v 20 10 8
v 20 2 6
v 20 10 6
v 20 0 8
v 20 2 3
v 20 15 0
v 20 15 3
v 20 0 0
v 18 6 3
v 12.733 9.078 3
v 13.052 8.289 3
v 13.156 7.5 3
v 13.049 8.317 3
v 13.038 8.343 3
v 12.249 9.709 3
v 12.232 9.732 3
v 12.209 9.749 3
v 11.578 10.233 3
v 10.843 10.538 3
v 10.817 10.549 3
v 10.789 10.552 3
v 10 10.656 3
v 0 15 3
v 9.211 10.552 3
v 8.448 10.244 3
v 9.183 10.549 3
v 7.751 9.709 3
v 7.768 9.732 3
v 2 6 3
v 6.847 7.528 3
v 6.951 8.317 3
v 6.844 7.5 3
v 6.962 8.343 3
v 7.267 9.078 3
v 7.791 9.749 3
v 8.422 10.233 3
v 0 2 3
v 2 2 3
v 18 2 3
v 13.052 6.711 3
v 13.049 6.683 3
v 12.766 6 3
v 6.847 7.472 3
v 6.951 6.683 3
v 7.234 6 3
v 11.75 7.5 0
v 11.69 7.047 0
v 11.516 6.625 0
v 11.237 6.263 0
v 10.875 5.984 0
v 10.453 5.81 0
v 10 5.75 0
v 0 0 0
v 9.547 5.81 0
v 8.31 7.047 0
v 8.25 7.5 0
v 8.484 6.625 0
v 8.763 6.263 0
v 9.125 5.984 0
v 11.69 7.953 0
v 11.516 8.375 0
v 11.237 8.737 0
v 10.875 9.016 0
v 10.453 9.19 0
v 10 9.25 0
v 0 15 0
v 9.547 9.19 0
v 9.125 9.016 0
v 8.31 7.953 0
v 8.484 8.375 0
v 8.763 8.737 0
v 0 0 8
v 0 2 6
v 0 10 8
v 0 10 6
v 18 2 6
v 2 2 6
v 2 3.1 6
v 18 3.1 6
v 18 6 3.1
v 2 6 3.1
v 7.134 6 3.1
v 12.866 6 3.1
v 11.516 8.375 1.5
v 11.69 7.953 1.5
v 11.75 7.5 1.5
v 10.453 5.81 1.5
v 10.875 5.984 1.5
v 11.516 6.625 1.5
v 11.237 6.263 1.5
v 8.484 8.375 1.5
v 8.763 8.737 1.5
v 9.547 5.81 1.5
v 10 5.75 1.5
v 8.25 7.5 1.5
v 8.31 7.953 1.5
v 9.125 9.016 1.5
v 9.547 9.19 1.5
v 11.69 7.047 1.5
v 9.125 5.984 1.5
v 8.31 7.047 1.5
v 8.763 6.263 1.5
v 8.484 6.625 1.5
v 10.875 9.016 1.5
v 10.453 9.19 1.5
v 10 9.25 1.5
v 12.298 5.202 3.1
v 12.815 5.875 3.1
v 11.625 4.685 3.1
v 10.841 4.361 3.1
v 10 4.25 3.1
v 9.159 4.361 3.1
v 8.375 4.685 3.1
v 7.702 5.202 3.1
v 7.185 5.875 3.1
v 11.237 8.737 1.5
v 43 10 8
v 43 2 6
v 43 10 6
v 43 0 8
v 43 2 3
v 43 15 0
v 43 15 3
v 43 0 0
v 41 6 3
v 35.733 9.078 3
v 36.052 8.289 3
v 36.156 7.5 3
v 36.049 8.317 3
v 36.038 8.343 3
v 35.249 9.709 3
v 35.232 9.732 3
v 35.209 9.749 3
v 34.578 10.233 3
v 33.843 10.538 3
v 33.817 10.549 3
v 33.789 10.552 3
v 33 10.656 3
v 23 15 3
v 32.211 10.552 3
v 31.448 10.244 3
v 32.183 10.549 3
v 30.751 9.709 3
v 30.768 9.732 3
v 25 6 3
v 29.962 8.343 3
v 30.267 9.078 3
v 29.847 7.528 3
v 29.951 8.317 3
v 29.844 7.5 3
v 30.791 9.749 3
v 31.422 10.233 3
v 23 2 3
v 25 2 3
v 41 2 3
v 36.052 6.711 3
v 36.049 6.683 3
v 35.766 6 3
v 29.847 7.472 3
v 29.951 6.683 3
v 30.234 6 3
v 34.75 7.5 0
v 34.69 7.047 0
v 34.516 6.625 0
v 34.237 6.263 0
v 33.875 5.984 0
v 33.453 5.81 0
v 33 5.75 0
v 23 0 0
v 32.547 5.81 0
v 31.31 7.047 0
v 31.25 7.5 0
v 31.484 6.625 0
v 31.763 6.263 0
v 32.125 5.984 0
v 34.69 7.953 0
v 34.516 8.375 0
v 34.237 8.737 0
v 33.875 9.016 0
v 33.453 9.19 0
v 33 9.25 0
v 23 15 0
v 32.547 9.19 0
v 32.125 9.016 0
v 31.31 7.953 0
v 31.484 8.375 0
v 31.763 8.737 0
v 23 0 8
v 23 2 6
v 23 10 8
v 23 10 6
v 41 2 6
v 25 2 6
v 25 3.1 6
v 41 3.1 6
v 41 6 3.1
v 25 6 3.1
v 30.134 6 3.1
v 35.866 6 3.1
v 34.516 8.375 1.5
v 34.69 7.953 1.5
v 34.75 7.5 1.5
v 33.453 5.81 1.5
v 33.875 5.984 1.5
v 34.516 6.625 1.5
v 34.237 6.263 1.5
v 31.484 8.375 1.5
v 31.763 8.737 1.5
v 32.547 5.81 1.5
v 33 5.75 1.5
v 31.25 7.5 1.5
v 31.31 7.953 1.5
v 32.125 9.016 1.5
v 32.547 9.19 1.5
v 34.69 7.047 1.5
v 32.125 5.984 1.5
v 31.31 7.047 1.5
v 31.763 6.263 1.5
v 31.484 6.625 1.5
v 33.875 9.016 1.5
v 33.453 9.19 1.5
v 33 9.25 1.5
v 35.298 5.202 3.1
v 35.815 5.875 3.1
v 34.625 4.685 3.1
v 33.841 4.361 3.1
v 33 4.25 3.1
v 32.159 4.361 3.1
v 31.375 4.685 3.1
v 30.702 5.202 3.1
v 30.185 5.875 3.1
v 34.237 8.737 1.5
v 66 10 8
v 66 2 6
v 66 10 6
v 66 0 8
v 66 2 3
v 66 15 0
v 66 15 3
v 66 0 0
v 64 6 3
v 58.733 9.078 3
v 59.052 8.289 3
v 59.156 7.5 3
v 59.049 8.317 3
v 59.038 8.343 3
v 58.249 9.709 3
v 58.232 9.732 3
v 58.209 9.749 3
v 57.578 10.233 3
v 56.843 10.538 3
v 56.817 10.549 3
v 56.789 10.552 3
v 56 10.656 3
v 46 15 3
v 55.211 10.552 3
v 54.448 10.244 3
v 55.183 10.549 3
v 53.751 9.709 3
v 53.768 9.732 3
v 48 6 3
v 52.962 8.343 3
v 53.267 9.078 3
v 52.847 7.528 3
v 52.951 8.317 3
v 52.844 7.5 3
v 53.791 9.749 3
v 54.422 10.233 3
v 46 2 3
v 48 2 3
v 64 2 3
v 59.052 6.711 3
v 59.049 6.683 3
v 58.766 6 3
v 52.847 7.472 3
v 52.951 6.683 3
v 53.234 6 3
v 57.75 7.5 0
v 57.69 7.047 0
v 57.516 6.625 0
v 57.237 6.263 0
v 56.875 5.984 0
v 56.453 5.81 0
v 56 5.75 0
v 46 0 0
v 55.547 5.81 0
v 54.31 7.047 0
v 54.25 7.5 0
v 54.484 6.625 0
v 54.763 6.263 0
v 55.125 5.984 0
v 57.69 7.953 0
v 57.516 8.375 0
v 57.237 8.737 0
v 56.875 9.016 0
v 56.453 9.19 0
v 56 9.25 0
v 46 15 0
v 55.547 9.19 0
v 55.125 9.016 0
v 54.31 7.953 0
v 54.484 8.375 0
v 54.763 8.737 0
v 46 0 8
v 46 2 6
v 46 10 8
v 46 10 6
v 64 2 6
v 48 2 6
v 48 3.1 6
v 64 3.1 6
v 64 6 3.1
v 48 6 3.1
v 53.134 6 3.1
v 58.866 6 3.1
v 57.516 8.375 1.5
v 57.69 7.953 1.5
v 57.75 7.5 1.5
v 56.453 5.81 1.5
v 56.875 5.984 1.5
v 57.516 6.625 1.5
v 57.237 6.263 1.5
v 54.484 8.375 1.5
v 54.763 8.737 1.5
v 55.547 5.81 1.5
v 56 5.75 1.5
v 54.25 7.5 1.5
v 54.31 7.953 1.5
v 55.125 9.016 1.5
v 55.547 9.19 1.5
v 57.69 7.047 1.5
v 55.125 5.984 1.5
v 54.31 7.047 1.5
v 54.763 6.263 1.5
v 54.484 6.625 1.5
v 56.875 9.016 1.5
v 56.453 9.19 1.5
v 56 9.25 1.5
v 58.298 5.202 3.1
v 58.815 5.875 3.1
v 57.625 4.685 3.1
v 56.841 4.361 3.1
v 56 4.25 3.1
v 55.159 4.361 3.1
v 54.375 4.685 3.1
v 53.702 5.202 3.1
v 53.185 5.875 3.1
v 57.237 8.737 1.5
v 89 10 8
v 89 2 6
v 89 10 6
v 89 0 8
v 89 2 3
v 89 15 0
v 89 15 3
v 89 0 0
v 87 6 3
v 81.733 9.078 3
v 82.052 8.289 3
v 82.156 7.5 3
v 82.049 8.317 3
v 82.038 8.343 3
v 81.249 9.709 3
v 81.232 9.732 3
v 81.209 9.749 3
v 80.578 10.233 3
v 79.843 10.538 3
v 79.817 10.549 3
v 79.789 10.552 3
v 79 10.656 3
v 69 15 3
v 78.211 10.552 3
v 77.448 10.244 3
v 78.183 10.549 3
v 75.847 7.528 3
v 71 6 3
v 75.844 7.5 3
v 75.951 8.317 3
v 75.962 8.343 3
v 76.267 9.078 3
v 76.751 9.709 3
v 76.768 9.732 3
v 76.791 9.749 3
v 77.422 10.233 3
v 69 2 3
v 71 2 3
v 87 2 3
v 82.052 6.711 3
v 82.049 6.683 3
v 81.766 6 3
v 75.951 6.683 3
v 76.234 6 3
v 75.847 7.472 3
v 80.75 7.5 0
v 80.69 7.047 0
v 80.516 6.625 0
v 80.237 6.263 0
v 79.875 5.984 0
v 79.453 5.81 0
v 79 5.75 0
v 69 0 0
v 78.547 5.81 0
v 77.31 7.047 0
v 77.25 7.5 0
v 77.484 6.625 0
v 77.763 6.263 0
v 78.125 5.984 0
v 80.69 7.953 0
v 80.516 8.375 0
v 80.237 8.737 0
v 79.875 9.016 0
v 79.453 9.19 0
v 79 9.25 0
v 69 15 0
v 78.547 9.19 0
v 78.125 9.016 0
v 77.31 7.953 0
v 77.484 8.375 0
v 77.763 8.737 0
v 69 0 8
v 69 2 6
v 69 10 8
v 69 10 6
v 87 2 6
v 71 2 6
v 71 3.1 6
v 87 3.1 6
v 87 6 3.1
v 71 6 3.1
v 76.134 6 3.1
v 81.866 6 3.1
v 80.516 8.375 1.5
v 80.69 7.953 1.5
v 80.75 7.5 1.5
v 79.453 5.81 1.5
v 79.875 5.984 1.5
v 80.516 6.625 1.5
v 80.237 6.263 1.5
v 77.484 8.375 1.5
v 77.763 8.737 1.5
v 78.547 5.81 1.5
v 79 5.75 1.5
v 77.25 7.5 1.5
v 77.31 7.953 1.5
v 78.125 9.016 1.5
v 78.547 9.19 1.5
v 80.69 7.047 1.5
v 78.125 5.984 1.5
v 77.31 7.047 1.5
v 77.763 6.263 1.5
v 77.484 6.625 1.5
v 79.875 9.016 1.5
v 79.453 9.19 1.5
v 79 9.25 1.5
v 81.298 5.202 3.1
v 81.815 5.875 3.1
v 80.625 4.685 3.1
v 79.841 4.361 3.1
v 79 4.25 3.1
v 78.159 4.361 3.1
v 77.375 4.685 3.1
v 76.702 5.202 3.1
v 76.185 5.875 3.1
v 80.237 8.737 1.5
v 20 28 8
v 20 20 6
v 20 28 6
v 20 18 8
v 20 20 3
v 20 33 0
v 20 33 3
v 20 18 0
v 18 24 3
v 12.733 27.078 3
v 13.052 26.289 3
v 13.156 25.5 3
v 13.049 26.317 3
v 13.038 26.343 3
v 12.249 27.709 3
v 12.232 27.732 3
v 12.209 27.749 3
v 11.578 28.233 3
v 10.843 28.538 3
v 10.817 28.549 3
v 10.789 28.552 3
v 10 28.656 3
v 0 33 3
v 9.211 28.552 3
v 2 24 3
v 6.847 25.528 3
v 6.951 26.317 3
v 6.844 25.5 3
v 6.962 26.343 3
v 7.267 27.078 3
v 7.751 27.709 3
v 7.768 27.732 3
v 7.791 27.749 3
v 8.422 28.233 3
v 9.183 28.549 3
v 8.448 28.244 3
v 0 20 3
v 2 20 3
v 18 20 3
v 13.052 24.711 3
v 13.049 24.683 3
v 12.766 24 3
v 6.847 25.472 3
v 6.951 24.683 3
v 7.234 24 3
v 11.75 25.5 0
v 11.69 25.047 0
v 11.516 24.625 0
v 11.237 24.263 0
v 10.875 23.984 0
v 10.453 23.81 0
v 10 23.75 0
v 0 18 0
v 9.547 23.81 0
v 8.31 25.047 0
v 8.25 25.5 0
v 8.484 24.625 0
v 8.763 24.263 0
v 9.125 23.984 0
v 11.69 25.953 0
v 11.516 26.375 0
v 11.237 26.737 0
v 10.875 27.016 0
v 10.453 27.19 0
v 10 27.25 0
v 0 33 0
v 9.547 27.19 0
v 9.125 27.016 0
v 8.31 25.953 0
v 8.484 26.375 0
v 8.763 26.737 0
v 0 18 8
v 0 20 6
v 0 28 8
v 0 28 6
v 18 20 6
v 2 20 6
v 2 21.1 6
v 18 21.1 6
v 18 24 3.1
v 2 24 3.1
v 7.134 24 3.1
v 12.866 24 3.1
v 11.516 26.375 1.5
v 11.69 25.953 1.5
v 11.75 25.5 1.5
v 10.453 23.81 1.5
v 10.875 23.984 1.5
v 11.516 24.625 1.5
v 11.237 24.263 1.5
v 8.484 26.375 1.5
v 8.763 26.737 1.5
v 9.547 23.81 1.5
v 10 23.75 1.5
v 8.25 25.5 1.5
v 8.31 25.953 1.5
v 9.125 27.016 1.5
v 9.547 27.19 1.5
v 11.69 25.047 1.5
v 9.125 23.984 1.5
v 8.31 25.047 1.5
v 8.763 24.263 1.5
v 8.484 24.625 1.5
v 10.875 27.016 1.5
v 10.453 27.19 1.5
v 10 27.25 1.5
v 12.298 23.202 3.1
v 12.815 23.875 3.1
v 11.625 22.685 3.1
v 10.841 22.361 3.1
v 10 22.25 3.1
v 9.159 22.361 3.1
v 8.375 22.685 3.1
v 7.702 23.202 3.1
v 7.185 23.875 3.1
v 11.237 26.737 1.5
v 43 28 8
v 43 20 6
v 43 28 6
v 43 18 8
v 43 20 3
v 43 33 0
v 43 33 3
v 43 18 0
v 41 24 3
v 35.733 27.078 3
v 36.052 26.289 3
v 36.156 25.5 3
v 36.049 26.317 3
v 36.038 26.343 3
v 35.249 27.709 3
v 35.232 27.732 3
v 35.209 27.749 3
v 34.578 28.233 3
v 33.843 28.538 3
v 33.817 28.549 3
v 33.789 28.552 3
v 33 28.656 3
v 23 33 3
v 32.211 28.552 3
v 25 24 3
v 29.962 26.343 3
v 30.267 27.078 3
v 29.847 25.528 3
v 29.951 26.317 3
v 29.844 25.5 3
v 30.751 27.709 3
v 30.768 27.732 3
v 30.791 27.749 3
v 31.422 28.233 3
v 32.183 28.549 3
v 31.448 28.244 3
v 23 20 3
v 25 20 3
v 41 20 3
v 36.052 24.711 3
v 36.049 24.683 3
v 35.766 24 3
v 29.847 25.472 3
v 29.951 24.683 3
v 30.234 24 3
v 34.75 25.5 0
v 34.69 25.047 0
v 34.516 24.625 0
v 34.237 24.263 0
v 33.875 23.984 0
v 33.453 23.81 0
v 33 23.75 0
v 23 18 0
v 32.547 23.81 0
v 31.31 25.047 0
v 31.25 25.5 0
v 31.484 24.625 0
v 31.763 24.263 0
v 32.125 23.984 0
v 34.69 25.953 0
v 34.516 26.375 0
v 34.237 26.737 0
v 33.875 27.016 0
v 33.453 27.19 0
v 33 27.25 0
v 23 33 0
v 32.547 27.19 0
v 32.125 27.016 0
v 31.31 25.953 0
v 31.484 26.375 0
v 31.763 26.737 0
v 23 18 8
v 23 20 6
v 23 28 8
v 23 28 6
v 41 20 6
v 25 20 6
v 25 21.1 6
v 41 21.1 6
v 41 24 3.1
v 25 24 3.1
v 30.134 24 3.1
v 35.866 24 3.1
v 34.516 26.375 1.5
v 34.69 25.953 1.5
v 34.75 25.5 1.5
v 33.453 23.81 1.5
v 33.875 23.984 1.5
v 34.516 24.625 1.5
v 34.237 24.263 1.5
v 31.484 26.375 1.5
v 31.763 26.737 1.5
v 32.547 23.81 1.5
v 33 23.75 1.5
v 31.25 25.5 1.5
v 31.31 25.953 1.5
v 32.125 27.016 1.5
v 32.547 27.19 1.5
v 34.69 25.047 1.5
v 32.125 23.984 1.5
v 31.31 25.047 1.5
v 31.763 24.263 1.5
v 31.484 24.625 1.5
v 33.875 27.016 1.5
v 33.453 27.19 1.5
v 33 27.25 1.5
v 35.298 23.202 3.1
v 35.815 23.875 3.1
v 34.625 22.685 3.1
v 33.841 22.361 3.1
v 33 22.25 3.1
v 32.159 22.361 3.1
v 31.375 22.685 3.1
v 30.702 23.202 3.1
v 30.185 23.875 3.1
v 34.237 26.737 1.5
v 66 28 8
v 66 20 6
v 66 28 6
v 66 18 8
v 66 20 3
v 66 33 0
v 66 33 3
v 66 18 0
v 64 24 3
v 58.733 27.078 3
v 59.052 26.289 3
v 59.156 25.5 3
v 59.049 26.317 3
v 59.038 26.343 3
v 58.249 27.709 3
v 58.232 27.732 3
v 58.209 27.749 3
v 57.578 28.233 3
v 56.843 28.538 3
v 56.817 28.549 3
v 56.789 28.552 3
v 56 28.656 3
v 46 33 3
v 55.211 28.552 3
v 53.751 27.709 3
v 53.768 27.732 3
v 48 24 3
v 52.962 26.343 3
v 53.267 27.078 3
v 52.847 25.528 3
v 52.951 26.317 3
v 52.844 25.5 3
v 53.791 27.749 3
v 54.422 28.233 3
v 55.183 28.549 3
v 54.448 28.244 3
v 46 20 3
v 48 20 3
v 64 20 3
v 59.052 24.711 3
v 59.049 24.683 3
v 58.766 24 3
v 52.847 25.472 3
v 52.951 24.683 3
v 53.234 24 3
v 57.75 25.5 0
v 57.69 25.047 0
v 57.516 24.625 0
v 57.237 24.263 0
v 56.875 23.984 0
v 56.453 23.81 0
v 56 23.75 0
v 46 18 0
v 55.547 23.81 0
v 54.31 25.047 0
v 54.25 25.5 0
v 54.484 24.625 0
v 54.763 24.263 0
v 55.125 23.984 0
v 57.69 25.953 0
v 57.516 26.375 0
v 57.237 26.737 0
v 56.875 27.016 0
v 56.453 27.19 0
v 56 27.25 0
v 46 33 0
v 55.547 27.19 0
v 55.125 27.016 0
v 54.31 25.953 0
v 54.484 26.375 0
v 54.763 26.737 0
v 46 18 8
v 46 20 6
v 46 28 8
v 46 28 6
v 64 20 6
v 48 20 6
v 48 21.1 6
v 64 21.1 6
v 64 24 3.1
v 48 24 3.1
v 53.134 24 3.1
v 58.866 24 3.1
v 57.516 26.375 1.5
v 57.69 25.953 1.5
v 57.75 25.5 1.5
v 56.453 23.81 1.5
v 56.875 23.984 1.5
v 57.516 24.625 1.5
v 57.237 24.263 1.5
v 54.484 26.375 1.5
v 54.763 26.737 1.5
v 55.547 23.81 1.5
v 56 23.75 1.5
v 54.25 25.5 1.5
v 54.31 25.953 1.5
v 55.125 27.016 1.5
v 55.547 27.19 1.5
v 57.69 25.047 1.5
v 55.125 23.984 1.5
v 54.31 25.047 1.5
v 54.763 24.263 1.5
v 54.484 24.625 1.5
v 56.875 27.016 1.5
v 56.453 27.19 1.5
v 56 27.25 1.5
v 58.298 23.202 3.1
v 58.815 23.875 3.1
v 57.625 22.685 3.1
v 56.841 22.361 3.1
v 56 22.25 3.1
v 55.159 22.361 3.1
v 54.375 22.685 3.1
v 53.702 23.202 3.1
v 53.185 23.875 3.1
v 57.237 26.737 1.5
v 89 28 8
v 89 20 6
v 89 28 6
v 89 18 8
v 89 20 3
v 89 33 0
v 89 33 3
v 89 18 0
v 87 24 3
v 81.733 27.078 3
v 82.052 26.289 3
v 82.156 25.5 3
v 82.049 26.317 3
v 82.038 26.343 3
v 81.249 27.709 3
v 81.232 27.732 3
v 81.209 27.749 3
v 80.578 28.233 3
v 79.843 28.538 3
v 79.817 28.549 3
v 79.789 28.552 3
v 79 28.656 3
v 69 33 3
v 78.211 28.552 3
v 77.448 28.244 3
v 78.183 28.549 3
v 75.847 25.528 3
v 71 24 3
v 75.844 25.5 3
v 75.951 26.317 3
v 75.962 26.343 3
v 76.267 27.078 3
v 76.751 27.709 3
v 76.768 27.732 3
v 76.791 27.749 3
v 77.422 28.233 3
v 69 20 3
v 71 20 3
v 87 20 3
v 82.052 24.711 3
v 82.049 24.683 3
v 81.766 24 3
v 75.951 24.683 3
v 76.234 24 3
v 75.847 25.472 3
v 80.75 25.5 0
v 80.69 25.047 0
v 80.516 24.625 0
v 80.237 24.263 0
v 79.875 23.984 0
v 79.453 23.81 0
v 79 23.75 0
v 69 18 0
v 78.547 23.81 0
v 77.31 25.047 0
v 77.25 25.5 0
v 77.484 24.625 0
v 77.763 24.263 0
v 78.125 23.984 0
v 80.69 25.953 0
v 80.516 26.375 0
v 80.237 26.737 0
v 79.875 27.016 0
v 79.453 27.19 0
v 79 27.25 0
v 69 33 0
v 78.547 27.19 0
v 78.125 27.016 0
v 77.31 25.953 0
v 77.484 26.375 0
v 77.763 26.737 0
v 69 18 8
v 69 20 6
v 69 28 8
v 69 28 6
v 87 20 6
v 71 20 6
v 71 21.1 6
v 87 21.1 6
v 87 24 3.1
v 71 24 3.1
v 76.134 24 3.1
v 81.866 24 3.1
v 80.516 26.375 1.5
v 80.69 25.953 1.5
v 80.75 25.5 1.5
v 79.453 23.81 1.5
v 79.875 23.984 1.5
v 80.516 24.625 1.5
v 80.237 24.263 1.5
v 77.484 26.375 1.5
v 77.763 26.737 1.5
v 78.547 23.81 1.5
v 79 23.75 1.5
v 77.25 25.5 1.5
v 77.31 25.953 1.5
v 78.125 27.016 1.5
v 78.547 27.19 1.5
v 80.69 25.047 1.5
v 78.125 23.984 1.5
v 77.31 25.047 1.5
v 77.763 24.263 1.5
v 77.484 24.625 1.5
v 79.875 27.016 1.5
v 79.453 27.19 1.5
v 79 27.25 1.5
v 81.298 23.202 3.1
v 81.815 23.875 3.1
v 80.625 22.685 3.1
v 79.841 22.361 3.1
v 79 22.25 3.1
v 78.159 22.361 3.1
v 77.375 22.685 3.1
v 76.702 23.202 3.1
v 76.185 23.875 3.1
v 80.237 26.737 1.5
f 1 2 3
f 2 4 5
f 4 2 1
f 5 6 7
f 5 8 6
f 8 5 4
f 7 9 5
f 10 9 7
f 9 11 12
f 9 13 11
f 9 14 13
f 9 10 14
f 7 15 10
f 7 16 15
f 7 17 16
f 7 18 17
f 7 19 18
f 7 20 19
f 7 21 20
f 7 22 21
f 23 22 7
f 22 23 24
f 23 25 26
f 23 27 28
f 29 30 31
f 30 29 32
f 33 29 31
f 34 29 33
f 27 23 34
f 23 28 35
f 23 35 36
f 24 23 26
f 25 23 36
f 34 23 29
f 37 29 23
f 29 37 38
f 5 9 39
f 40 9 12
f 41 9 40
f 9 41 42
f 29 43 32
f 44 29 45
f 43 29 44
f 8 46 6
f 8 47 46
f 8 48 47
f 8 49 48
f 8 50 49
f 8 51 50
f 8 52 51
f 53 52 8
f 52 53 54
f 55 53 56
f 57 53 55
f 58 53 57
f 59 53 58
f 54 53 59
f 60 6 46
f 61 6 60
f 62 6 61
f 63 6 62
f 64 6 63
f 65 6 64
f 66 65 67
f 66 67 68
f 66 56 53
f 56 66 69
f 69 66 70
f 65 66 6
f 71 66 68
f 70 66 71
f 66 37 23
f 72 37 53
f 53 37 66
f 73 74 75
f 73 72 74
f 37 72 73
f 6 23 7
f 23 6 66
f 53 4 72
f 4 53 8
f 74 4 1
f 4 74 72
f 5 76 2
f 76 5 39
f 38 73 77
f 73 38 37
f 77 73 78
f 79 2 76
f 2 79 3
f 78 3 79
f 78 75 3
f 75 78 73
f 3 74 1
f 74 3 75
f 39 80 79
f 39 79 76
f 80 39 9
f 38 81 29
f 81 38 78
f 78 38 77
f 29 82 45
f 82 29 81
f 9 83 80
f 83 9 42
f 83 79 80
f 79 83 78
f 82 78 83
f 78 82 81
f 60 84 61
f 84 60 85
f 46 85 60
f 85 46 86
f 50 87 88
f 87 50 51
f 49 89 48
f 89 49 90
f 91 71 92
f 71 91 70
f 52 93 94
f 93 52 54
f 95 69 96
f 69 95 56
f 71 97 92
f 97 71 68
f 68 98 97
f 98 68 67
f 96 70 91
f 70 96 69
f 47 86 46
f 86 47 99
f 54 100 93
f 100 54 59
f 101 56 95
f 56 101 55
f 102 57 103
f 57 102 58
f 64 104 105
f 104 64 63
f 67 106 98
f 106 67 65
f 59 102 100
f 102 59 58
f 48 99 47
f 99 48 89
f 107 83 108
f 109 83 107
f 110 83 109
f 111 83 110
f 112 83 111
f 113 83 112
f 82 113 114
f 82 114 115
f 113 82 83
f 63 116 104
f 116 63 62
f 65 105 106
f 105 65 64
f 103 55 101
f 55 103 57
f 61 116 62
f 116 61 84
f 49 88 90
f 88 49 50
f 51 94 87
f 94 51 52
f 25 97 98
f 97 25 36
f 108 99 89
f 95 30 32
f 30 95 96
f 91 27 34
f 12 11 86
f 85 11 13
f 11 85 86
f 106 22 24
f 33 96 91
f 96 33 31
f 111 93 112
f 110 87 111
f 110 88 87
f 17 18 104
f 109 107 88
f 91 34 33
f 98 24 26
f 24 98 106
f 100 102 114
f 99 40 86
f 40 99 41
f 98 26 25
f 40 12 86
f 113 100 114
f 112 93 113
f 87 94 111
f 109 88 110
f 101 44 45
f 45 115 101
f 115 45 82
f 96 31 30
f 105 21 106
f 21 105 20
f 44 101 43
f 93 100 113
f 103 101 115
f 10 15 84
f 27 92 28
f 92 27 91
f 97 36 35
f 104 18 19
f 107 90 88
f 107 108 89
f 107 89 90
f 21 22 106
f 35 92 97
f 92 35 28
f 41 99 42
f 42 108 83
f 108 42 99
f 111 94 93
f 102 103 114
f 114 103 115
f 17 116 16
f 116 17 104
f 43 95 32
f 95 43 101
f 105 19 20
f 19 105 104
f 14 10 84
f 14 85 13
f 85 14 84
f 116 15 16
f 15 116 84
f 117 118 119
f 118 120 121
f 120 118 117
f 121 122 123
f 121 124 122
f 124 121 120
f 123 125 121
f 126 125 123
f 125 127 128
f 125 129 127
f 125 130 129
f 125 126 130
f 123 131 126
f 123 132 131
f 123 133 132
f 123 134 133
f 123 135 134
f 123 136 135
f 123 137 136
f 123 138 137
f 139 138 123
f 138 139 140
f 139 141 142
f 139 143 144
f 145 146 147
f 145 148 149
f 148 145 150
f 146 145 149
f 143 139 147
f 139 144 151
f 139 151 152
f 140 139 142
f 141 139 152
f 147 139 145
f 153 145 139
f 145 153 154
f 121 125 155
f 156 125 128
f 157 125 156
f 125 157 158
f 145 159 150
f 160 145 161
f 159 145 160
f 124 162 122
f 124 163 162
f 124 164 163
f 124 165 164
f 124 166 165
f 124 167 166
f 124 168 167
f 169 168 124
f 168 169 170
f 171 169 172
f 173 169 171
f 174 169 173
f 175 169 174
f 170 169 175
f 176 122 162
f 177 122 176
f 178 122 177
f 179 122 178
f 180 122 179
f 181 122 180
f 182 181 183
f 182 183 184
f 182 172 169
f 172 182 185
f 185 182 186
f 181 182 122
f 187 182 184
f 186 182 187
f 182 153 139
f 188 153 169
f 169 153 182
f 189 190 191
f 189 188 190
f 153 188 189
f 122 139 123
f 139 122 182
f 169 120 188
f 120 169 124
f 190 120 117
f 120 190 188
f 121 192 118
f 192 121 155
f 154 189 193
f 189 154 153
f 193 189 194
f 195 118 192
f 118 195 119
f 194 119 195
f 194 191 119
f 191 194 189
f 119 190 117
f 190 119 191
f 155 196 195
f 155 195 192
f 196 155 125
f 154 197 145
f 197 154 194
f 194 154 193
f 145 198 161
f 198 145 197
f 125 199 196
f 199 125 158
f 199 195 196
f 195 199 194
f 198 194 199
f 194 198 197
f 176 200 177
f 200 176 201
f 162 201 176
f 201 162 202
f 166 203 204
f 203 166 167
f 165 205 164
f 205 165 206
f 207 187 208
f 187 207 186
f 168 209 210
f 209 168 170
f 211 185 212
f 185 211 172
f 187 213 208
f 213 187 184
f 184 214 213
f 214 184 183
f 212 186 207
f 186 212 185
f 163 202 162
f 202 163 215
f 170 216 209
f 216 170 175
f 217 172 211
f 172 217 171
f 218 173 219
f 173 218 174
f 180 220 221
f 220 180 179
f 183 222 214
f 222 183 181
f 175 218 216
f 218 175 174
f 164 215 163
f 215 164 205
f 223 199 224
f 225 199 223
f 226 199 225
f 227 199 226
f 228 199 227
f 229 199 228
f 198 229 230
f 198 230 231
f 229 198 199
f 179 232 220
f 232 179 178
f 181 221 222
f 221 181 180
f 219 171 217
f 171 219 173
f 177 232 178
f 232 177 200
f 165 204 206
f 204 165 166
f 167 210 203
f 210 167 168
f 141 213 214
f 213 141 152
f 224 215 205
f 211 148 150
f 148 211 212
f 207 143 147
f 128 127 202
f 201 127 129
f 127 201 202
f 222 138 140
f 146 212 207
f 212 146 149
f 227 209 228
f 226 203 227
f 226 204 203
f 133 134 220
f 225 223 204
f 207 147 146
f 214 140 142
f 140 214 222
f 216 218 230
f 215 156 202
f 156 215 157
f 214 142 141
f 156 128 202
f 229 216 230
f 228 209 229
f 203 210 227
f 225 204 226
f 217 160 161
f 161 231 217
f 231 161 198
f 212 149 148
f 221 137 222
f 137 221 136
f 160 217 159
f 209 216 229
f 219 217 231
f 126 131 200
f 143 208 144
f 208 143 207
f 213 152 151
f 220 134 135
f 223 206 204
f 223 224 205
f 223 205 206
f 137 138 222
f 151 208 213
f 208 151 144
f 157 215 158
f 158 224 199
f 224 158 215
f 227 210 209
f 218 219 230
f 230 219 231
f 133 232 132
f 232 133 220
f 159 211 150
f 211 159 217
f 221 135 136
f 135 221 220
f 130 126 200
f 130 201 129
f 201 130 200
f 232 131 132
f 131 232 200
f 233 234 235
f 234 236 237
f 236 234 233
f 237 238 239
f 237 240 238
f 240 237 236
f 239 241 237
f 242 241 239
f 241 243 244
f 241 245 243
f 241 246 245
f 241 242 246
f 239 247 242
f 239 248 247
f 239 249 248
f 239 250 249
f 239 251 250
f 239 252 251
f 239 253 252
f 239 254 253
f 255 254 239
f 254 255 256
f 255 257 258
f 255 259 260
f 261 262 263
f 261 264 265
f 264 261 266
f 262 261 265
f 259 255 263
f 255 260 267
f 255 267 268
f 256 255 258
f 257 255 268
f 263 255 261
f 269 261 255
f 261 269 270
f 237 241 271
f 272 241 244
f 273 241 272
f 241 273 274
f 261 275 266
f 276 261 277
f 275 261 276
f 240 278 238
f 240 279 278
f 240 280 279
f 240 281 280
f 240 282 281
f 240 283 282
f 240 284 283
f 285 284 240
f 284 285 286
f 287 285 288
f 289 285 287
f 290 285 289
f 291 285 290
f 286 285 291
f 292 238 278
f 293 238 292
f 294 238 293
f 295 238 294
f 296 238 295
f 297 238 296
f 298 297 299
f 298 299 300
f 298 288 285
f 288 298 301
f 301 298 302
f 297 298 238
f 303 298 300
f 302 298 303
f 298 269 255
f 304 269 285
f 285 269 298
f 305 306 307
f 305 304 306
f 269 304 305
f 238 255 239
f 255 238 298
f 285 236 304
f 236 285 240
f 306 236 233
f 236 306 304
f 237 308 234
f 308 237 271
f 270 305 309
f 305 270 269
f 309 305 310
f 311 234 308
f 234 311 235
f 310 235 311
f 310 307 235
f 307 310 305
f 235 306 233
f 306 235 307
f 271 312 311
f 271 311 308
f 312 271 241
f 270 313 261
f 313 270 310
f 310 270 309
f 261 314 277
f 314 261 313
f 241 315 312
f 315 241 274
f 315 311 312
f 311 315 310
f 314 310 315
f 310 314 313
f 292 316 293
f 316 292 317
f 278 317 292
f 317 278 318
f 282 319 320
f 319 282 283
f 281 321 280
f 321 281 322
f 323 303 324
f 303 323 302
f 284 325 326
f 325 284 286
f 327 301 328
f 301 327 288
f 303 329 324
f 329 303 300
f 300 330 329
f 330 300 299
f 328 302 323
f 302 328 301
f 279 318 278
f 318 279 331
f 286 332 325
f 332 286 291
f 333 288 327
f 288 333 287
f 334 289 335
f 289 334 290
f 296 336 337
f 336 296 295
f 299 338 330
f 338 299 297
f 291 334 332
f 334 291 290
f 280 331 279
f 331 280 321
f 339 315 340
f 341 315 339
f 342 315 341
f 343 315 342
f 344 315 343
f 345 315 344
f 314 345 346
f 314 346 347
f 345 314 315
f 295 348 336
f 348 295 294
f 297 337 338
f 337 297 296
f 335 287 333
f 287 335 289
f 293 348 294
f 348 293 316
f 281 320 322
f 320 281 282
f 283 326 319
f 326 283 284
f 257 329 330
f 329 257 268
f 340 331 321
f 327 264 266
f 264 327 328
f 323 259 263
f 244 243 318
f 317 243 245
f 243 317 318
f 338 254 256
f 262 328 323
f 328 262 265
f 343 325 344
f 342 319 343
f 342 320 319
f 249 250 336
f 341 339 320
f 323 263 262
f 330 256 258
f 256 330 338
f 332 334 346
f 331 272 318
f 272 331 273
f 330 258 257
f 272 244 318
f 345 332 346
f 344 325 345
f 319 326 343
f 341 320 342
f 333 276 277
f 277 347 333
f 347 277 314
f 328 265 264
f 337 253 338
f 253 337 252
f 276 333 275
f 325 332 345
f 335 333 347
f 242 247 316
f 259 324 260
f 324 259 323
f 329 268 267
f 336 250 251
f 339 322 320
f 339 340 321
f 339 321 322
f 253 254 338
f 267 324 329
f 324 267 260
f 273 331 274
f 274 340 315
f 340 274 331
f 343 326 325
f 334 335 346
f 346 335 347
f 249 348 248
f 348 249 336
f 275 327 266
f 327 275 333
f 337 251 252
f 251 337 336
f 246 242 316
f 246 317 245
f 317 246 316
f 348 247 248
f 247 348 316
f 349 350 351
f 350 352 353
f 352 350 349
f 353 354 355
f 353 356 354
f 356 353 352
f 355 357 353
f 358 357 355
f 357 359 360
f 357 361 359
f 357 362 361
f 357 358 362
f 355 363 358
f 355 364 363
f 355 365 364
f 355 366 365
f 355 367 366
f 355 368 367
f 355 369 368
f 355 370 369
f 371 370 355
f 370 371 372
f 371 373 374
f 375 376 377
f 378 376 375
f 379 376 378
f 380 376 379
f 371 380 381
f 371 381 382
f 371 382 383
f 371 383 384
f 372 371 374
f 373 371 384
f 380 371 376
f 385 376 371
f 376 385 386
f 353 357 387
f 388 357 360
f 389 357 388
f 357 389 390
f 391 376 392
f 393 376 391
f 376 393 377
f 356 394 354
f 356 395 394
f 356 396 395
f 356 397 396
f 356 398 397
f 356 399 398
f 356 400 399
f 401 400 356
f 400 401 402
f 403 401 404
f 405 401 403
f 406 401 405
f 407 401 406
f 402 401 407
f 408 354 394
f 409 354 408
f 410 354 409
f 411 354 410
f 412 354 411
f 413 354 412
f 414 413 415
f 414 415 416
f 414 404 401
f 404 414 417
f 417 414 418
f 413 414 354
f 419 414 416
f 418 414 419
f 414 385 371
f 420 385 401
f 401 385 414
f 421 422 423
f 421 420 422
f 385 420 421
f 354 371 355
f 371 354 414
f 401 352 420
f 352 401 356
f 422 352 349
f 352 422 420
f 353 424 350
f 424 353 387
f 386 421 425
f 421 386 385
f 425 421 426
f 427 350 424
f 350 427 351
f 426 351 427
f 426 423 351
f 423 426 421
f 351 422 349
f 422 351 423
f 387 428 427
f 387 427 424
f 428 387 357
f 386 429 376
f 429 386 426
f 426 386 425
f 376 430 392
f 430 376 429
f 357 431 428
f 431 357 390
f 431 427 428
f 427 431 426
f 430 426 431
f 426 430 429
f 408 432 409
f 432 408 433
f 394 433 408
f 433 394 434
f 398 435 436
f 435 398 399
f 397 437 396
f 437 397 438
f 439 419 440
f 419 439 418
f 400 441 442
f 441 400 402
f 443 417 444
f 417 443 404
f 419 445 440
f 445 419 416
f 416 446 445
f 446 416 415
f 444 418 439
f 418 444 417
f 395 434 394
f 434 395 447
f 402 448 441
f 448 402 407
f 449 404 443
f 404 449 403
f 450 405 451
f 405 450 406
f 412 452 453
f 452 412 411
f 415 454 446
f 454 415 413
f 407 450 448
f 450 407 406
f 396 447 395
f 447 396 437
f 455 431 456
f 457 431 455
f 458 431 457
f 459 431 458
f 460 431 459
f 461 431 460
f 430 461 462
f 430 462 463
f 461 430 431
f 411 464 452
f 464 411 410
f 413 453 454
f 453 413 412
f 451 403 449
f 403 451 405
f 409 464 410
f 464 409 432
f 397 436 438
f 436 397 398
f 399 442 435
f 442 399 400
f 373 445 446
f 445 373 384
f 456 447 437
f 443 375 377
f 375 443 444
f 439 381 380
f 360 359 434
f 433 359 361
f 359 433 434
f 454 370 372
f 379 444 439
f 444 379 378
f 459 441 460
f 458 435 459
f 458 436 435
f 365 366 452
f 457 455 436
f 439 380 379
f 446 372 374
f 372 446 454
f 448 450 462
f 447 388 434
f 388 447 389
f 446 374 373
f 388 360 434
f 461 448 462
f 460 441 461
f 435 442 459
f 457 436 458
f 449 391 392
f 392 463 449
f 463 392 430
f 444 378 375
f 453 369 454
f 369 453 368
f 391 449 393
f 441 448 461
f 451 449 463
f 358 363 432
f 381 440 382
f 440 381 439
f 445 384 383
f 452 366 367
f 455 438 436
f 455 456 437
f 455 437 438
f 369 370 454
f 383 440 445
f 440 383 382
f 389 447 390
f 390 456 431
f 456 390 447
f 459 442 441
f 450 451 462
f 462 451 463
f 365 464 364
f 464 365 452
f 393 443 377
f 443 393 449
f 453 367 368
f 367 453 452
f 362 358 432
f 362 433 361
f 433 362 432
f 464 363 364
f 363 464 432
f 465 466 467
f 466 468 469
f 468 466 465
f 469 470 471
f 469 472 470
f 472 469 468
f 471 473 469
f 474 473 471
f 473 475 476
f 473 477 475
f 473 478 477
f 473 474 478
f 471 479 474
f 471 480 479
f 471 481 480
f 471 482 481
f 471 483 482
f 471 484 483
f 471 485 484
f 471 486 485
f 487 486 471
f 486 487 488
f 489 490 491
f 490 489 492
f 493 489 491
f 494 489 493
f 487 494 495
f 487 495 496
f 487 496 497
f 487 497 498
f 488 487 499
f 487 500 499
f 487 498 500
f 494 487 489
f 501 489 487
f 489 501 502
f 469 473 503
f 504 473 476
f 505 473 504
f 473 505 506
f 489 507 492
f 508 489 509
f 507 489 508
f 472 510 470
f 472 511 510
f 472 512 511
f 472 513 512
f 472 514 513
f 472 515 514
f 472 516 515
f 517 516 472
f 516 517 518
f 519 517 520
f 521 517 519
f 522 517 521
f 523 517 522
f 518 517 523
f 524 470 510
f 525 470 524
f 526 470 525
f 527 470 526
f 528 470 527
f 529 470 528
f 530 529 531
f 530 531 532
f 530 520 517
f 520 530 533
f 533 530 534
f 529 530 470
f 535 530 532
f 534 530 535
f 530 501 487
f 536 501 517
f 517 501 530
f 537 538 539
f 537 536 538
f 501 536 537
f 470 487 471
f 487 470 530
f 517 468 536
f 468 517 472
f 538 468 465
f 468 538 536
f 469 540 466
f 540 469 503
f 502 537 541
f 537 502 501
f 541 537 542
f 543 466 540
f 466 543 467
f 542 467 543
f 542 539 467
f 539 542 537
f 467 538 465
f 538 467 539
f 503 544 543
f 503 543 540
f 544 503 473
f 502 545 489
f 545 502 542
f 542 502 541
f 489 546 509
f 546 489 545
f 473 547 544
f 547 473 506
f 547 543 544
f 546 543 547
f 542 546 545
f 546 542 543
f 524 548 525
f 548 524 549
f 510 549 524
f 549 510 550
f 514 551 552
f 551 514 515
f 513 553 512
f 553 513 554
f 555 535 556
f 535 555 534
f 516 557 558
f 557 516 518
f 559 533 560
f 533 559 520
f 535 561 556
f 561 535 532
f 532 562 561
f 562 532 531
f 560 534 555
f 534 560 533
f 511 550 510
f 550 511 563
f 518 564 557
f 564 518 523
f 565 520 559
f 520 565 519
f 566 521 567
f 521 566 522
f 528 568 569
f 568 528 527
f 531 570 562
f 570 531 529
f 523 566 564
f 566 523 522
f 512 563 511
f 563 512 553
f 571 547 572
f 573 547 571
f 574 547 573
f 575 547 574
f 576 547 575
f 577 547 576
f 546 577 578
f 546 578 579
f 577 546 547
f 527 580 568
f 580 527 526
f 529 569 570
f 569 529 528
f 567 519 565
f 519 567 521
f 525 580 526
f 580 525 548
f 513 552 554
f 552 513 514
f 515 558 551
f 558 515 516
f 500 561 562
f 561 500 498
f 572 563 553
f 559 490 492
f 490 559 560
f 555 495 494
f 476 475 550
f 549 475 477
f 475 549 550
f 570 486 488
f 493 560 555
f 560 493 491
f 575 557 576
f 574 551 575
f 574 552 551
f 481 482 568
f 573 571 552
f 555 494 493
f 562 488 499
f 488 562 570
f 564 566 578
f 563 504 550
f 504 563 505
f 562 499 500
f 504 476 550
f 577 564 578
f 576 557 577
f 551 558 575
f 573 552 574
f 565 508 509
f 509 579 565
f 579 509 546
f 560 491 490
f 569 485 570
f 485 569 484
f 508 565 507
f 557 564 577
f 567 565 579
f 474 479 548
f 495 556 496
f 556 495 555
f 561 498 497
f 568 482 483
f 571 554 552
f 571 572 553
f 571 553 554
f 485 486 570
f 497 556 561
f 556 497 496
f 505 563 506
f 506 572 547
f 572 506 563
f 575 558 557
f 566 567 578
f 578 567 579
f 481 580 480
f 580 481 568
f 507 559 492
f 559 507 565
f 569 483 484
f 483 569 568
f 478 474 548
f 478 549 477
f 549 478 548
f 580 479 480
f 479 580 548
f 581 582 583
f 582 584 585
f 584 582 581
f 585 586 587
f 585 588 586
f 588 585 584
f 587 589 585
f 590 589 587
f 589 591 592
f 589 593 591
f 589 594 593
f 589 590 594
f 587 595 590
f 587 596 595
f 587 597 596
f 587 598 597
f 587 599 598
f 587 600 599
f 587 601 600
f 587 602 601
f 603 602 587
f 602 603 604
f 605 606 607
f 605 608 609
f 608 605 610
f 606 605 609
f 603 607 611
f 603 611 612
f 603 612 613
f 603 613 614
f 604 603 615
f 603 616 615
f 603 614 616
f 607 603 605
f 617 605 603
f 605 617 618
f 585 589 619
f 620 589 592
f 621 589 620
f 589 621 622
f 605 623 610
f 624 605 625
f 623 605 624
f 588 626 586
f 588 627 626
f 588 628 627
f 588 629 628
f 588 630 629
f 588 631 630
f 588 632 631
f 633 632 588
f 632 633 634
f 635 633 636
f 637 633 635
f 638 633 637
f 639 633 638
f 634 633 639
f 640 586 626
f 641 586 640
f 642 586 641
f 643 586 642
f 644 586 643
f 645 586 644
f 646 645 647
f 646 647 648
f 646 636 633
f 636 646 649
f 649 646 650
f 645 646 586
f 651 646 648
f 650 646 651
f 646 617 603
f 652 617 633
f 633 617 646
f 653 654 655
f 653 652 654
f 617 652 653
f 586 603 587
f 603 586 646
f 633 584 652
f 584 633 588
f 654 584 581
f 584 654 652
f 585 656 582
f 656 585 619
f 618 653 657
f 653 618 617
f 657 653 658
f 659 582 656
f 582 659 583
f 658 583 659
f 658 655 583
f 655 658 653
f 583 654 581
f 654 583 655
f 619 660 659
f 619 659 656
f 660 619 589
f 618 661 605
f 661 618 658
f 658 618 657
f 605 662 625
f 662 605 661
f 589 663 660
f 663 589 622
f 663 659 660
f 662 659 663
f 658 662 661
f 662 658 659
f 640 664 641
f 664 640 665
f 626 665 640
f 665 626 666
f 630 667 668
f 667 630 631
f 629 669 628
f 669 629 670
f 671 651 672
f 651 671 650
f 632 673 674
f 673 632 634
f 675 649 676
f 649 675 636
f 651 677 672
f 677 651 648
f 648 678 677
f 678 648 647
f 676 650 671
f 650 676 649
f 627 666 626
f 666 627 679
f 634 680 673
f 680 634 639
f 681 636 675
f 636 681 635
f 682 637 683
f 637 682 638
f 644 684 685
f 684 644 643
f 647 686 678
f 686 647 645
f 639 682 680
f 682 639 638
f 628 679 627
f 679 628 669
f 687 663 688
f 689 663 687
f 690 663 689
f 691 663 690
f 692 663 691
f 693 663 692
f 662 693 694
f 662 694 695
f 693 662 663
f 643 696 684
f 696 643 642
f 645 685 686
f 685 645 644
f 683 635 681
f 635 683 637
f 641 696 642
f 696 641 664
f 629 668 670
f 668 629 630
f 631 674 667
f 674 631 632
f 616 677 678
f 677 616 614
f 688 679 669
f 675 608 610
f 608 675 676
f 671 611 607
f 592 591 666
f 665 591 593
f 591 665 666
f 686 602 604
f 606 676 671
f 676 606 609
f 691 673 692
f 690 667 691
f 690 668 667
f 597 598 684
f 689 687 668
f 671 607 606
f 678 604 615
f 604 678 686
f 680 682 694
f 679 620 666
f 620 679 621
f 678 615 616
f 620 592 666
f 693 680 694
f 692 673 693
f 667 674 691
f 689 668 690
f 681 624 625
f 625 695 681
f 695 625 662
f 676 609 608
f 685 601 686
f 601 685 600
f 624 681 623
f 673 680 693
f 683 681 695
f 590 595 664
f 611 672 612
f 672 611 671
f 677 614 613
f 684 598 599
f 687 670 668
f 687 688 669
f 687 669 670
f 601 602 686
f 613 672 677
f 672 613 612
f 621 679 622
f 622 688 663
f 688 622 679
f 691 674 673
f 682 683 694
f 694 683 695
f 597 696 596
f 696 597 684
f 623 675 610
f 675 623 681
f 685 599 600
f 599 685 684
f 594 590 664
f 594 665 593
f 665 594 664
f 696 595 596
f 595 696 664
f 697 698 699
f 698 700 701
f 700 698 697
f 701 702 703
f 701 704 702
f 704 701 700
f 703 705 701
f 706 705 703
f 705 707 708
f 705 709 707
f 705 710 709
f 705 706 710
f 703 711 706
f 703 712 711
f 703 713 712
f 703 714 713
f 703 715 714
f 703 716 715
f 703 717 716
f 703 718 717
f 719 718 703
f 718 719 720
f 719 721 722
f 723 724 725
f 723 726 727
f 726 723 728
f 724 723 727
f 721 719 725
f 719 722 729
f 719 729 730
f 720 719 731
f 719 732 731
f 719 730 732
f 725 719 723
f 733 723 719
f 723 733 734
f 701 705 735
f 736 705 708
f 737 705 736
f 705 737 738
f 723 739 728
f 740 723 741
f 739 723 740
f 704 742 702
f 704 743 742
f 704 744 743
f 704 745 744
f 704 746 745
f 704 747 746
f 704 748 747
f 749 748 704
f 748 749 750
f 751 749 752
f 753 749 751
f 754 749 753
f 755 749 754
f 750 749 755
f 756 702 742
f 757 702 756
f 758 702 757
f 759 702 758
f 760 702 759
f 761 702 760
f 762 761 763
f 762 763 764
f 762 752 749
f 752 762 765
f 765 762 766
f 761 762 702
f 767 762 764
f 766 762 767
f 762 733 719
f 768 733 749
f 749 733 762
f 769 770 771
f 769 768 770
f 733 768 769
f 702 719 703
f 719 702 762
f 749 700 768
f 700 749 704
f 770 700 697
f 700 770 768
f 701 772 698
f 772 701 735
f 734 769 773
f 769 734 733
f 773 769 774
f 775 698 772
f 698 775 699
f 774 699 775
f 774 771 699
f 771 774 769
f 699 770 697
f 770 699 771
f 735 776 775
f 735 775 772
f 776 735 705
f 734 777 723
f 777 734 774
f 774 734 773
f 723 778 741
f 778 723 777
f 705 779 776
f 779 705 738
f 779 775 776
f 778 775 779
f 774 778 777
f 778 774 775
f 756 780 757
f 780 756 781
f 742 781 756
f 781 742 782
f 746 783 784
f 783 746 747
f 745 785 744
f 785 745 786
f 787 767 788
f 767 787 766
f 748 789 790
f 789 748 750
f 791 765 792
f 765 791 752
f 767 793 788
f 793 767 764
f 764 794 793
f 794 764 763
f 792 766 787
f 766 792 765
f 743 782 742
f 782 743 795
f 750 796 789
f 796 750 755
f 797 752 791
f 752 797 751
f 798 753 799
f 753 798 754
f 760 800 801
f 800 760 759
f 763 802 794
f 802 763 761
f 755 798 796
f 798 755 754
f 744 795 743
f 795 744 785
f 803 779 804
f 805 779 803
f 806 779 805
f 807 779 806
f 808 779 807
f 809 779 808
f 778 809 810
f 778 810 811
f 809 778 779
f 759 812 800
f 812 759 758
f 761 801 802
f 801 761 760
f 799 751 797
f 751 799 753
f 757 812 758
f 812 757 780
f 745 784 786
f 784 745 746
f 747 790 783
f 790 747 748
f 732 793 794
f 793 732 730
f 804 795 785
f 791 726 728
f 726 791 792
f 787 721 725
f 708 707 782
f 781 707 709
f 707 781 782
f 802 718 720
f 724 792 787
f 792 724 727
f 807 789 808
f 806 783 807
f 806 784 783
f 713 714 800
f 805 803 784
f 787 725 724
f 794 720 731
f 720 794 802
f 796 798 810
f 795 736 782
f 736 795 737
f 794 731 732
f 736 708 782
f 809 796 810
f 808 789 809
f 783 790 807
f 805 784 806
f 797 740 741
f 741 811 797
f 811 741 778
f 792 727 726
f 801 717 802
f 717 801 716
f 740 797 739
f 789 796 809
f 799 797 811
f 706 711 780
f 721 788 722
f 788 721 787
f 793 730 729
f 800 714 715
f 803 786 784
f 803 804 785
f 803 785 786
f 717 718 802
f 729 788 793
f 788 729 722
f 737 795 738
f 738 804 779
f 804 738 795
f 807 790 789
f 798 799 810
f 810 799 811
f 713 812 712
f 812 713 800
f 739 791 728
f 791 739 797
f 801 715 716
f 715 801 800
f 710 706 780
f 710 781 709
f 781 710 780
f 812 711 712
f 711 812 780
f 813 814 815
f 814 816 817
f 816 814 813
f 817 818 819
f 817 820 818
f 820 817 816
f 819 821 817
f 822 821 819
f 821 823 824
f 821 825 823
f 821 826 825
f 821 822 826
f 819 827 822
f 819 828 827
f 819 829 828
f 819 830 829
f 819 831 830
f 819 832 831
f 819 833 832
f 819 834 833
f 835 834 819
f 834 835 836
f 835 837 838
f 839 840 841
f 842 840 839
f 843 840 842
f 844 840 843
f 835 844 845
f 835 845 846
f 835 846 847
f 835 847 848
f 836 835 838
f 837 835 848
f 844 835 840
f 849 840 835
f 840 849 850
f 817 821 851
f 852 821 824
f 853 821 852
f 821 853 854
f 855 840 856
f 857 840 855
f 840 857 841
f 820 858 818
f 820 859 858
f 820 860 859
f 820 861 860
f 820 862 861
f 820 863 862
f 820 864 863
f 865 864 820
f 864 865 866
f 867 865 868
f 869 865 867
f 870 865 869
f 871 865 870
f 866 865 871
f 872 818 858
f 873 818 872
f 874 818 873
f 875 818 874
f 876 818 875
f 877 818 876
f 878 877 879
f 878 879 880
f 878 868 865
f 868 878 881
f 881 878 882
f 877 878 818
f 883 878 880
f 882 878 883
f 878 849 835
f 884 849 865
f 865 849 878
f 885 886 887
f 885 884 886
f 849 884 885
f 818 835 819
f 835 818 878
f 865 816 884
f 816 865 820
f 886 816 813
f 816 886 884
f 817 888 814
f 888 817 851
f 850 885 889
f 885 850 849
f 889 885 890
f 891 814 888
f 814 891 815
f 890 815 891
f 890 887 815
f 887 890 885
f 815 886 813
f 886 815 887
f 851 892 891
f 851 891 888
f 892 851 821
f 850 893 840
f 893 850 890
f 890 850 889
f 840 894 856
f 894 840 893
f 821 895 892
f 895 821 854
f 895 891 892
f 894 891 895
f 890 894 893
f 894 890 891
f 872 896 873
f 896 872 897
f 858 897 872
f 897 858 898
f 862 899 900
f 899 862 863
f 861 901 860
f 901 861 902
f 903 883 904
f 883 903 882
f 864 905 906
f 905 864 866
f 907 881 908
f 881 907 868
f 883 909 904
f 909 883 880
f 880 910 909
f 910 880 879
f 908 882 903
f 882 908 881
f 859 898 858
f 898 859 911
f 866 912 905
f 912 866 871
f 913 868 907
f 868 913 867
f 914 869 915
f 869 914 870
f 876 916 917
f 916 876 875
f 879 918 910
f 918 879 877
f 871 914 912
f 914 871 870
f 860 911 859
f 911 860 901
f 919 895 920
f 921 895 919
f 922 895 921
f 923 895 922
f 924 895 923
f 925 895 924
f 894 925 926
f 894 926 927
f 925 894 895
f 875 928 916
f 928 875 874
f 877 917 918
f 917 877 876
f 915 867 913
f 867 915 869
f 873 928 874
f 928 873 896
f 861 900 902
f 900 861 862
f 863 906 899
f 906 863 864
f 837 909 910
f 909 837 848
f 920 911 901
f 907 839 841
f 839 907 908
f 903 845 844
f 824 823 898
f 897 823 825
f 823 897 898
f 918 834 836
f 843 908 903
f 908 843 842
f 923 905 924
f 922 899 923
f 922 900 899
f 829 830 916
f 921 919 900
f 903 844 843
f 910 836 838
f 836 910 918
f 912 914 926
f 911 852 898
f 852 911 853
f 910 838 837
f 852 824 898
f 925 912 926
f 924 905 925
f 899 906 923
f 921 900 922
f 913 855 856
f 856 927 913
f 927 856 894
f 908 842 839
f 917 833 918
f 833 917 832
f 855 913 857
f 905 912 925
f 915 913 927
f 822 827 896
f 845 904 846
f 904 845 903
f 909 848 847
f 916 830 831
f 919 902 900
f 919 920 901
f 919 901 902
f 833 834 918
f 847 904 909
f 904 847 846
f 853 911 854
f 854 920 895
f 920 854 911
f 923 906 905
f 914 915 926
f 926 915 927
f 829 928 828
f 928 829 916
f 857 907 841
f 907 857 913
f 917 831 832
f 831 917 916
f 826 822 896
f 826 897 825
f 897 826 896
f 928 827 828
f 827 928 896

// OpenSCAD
// ============================================================
// PRINT: CLIPS RETENÇÃO — HEPA
// 8 unidades — braço 5mm (borda filtro 2mm + MDF 3mm)
// Mesa: ~92mm × 33mm — cabe na Ender 3 (200×200mm) ✓
// Divisória: 10_DIVISORIA_HEPA — Abertura 100×130mm
// ============================================================
// Clip com braço curto (5mm) — segura apenas a borda fina do HEPA
// Borda HEPA: 5mm largura × 2mm espessura
// Orientação: base na mesa (Z=0), braço+aba para cima
// Infill recomendado: 80-100%
// Material: PETG (melhor) ou PLA
// Parafusos: 8× M3×6mm + 8× porca M3
// ============================================================
// Posições M3 na divisória (coordenadas NC):
//   (57,100)(57,140)(187,100)(187,140)
//   (105,40)(139,40)(105,200)(139,200)
// ============================================================

use <SNAP_TAMPA.scad>

gap = 3;
ret_w = 20;
ret_d = 15;

// 4 colunas × 2 fileiras = 8 clips HEPA (braço 5mm)
for (row = [0:1]) {
    for (col = [0:3]) {
        translate([col * (ret_w + gap), row * (ret_d + gap), 0])
            clip_hepa();
    }
}

// Guia visual da mesa (não imprime)
%translate([0, 0, -0.5])
    cube([200, 200, 0.1]);
